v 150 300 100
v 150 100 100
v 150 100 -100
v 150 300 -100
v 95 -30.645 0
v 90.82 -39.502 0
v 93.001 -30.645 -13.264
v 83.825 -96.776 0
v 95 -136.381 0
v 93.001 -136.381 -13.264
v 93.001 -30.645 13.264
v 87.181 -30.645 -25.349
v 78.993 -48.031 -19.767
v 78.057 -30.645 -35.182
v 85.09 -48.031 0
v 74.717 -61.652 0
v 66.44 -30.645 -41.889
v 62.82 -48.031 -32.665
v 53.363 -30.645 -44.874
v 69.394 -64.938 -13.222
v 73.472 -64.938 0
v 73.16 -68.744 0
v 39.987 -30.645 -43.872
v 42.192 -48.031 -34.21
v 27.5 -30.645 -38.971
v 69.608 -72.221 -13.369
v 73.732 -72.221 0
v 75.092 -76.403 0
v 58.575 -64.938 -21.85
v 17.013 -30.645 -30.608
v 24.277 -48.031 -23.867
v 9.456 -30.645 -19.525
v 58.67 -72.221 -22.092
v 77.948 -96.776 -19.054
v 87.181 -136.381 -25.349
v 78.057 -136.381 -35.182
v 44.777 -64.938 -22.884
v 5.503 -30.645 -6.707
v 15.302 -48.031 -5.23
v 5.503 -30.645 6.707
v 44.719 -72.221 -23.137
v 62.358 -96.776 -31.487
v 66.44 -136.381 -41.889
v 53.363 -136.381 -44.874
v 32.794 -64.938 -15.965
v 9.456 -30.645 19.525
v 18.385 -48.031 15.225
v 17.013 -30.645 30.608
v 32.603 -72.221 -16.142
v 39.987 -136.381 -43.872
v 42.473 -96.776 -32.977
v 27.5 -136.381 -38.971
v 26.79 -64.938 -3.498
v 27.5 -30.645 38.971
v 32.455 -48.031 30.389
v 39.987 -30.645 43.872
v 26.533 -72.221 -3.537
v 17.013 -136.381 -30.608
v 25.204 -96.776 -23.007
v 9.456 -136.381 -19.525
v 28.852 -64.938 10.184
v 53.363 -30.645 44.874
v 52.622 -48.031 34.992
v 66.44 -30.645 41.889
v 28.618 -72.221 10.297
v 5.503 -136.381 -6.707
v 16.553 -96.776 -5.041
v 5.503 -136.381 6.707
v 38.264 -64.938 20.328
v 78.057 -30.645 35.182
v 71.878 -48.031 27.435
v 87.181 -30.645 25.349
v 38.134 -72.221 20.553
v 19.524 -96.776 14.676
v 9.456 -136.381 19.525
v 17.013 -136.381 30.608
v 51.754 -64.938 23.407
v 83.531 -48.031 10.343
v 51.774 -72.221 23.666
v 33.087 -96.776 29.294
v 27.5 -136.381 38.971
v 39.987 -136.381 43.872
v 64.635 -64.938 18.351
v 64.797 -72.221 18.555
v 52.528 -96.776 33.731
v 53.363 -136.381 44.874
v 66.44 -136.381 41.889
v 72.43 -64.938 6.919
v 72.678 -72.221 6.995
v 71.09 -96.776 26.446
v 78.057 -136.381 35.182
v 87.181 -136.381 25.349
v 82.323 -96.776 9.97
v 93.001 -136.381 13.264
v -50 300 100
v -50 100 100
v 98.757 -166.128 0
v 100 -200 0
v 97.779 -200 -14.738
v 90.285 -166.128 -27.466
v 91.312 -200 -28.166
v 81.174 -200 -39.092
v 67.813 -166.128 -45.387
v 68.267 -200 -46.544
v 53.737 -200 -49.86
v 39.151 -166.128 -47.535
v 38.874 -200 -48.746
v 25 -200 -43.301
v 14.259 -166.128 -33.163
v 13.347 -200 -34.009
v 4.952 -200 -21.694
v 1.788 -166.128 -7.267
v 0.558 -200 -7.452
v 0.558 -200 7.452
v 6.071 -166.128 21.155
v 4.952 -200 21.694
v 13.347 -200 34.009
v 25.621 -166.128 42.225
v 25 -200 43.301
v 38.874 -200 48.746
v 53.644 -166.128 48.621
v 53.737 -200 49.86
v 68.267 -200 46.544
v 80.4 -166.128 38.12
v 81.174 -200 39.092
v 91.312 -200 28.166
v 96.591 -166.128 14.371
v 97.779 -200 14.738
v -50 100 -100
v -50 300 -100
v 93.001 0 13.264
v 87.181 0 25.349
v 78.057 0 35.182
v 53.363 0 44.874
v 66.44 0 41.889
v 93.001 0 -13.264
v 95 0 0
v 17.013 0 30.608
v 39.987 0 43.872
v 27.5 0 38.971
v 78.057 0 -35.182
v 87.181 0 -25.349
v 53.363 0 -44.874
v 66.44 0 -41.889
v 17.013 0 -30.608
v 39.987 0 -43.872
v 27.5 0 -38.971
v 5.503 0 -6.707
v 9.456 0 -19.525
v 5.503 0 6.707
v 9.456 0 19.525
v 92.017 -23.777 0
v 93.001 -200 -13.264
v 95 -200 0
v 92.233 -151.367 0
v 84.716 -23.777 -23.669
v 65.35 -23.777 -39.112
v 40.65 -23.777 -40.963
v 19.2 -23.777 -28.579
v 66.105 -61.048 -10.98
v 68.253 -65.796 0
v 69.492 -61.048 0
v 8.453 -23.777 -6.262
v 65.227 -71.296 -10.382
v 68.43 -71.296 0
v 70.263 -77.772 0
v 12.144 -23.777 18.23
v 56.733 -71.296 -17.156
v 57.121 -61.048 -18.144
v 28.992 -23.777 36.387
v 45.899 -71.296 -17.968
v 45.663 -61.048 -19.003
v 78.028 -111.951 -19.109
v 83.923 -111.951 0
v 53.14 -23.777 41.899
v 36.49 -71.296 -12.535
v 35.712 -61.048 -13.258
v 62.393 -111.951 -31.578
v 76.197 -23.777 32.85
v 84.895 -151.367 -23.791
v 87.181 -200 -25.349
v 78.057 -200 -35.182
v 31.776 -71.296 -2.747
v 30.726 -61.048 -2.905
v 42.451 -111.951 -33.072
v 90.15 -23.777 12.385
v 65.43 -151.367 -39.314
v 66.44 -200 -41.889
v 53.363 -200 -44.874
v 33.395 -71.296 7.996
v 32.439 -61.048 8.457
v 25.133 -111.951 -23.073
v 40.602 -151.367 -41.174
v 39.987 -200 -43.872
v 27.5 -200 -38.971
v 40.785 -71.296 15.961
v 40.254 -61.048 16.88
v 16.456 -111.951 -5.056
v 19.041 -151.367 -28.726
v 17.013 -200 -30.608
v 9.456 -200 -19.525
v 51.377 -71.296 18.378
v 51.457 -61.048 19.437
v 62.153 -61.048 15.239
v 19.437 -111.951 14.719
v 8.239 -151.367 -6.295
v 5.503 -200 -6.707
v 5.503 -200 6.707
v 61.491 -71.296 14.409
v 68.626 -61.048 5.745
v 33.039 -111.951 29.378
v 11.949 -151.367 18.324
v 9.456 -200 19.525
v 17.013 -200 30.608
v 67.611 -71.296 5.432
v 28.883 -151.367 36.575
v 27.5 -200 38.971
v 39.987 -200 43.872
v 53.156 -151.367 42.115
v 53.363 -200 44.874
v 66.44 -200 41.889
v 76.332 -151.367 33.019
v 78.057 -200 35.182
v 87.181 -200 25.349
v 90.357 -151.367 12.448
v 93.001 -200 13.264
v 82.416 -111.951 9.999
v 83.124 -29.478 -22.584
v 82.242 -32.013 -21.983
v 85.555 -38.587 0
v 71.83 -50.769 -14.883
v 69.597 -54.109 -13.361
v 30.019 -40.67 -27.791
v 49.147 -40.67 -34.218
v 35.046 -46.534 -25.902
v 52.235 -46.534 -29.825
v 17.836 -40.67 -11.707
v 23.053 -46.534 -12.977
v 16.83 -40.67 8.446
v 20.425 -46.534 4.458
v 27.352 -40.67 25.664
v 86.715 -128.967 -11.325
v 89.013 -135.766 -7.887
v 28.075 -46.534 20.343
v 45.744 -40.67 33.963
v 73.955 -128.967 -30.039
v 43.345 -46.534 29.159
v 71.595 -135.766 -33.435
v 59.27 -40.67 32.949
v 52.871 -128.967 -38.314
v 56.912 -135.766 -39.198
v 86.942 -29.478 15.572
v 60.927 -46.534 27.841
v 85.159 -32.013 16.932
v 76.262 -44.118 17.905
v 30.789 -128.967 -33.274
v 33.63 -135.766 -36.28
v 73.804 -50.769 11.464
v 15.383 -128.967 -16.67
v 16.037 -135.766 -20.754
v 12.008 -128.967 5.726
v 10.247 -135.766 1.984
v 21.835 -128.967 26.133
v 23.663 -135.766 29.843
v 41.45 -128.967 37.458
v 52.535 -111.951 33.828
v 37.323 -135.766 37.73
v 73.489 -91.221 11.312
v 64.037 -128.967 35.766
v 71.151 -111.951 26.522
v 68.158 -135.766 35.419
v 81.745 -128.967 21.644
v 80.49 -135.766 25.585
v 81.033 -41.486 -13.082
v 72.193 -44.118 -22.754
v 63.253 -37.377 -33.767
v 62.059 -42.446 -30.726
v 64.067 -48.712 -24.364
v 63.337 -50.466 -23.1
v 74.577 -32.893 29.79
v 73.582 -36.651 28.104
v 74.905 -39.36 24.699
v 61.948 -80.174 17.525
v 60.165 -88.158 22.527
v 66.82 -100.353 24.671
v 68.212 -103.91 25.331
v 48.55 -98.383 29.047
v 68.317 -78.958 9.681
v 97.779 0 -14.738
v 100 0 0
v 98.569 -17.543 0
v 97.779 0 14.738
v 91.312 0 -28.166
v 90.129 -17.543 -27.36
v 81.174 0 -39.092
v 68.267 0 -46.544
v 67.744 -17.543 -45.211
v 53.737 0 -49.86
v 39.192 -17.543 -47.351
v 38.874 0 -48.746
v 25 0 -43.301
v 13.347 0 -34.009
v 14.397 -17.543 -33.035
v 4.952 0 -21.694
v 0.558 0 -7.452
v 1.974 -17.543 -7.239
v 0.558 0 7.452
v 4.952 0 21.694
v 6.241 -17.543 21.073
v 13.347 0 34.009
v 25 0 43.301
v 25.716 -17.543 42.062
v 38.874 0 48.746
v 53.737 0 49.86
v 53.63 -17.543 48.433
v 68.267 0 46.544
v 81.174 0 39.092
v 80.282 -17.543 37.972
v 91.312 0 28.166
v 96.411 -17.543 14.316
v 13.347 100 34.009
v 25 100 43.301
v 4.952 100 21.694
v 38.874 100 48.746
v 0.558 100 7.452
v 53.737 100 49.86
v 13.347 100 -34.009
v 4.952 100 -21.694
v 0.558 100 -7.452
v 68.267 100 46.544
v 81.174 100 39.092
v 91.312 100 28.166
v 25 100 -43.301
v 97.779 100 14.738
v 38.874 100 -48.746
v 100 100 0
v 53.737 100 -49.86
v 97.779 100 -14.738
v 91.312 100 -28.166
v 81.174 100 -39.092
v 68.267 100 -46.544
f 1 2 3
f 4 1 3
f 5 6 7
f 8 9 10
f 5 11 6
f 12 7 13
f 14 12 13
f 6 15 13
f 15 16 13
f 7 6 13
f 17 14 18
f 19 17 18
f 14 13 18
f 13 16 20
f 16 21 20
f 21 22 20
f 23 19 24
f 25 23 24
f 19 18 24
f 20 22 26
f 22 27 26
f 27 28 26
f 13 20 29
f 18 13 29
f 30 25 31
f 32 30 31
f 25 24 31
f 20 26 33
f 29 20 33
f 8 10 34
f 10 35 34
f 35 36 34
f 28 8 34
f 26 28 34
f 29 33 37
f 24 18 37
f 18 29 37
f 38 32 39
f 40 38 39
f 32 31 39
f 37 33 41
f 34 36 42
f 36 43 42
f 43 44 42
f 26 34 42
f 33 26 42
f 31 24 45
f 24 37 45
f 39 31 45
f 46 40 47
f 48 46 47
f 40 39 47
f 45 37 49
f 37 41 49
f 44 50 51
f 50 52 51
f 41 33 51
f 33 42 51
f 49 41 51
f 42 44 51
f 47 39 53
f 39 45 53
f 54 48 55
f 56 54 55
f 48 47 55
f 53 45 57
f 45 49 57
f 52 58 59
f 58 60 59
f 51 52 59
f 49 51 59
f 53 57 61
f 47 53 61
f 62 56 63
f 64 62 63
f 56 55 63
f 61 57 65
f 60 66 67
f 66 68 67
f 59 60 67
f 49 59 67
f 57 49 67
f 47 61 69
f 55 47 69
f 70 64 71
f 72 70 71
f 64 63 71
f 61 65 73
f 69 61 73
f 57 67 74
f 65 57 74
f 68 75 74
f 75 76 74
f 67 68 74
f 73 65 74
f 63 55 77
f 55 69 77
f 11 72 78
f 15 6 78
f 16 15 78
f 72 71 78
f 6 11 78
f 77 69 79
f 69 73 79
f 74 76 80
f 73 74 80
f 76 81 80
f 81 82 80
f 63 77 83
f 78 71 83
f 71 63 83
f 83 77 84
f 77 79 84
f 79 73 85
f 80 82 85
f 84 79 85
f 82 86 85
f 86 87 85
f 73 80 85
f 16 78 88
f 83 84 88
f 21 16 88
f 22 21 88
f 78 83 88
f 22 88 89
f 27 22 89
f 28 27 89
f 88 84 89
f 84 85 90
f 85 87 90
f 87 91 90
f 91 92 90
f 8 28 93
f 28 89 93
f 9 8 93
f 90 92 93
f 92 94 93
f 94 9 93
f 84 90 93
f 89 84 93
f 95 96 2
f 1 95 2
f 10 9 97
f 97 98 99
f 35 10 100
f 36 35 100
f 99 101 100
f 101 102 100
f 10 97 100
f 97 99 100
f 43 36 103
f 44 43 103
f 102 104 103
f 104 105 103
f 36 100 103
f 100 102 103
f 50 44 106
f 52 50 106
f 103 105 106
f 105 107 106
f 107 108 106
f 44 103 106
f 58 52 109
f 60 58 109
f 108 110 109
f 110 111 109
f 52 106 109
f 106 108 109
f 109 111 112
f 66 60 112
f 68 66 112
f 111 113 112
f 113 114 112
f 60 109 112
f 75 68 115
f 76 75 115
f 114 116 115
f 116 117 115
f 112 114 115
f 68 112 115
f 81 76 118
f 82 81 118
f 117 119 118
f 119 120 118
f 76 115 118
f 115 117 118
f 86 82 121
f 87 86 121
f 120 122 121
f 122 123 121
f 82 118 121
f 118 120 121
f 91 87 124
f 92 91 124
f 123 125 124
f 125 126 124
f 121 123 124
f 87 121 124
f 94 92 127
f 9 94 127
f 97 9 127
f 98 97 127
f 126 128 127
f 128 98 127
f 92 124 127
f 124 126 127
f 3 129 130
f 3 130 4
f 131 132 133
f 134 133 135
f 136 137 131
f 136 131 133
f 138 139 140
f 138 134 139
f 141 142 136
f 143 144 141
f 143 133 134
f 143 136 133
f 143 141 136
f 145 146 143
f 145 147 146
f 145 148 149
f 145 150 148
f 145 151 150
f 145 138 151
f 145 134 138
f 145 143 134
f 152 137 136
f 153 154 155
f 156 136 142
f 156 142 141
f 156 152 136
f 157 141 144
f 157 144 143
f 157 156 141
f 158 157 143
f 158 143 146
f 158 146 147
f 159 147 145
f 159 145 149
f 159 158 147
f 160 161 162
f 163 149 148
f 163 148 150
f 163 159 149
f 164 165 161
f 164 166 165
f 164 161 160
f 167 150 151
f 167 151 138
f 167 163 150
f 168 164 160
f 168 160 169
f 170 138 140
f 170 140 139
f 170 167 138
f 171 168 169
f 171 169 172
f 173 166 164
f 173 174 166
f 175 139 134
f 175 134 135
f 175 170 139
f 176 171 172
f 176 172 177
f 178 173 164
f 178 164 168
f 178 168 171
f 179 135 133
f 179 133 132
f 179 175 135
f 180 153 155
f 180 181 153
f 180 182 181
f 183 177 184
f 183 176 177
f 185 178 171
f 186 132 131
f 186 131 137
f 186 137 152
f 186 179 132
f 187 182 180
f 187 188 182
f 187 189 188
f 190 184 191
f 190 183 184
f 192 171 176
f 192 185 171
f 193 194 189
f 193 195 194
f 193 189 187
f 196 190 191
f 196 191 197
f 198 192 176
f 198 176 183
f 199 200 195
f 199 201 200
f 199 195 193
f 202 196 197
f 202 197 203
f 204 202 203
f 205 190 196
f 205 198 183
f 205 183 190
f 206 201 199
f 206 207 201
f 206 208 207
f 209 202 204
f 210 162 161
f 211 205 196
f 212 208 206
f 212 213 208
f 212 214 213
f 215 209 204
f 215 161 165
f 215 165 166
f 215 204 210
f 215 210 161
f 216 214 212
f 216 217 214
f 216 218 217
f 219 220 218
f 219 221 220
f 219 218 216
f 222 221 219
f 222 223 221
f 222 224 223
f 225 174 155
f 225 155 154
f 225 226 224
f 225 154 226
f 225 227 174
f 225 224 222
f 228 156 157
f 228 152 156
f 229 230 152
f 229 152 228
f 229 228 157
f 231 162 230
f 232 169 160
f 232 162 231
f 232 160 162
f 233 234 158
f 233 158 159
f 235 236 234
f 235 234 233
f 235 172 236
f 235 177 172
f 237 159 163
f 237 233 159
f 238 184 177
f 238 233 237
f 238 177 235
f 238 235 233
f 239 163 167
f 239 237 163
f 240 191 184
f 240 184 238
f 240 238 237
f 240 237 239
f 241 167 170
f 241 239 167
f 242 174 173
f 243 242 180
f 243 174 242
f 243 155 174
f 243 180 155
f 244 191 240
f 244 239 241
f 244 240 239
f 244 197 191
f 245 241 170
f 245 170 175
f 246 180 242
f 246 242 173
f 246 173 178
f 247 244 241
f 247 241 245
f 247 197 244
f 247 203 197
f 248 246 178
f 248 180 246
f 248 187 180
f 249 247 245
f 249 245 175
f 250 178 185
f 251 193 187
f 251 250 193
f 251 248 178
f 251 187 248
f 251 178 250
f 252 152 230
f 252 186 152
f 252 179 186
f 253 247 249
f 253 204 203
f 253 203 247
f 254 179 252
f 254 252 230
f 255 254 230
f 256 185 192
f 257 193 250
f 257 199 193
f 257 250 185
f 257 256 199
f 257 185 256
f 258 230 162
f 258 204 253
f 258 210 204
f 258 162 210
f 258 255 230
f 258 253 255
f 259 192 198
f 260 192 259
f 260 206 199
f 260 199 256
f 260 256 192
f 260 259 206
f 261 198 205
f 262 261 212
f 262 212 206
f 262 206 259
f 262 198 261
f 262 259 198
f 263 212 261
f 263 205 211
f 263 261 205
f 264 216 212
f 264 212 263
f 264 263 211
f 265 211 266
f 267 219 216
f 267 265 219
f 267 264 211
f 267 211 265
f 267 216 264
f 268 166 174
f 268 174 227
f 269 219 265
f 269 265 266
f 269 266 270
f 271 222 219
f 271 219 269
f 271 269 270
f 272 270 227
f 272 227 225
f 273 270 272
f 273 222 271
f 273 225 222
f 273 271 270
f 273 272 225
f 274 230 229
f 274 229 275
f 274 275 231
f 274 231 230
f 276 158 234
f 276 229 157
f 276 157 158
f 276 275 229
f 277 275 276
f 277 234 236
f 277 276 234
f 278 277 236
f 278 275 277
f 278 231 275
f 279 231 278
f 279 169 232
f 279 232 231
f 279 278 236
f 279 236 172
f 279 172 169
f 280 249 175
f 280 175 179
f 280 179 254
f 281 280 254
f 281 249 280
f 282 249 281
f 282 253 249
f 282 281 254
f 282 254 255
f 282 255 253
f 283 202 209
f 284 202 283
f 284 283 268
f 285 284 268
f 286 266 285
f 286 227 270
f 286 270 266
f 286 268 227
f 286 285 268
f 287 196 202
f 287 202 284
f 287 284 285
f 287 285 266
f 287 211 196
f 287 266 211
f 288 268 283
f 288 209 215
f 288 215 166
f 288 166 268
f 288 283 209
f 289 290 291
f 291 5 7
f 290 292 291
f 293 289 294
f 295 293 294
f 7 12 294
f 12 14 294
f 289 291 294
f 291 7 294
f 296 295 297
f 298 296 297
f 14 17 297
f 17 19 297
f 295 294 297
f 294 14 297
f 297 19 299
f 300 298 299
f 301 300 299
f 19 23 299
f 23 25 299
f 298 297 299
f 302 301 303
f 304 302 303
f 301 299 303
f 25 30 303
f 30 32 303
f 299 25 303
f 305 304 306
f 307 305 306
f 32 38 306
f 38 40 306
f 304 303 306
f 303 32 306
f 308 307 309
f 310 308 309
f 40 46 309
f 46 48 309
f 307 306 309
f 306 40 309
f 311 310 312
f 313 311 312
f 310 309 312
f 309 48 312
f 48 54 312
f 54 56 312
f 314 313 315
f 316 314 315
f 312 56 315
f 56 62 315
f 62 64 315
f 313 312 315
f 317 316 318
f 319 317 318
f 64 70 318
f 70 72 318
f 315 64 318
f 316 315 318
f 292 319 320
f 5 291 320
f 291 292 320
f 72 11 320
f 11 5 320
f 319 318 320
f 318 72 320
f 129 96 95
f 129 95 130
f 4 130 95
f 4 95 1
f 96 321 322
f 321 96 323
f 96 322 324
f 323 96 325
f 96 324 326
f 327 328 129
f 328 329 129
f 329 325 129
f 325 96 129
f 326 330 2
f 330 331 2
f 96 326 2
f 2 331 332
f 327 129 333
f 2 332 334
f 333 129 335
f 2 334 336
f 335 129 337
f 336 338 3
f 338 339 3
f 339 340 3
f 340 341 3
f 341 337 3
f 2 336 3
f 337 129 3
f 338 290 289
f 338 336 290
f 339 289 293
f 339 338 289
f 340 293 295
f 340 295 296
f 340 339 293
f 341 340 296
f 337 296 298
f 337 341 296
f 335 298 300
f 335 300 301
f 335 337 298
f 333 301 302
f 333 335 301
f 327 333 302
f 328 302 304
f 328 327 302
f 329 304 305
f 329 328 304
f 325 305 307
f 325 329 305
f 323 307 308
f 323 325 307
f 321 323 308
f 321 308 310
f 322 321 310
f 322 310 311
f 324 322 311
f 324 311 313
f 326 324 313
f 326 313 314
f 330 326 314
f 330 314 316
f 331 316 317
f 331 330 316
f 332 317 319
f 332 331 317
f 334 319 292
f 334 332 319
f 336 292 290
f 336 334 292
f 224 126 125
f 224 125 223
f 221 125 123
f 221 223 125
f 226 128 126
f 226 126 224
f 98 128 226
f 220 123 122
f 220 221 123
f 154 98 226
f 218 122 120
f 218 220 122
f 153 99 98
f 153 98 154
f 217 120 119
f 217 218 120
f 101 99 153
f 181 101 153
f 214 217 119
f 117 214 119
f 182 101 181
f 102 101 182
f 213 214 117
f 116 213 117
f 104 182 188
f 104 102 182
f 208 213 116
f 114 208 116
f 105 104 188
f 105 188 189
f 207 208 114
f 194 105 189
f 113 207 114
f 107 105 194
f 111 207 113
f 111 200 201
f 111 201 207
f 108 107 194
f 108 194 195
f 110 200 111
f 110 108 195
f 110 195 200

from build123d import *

# Parameters (mm, degrees)
REVOLVE1_OUTLINE_W   = 5
REVOLVE1_OUTLINE_H   = 100
REVOLVE1_OUTLINE_W_2 = 45
SKETCH2_W            = 200
SKETCH2_H            = 200
BOSS_EXTRUDE1_DEPTH  = 200


# Read off the part's stored shape, not the designer's step: Revolve1
with BuildPart() as part:
    # Revolve1 outline → Revolve1 (revolve)
    with BuildSketch(Plane(origin=(50, 0, 0), x_dir=(1, 0, 0), z_dir=(0, 0, 1))):
        with Locations((47.5, 50)):
            Rectangle(REVOLVE1_OUTLINE_W, REVOLVE1_OUTLINE_H)
        with BuildLine():
            add(Edge.make_bspline(
                [(50, 0), (50, -8.082762567), (49.349957781, -15.002219913), (48.209745328, -20.96390459), (46.719575094, -26.132708235), (45, -30.644804173)],
                knots=[0, 0, 0, 0, 0, 0, 0.122970463, 0.122970463, 0.122970463, 0.122970463, 0.122970463, 0.122970463], degree=5))
            Line((50, 0), (45, 0))
            Line((45, 0), (45, -30.644804173))
        make_face()
        with Locations((22.5, 50)):
            Rectangle(REVOLVE1_OUTLINE_W_2, REVOLVE1_OUTLINE_H)
        with BuildLine():
            add(Edge.make_bspline(
                [(45, -30.644804173), (34.455506857, -58.313130409), (15.284968329, -61.288036888), (15.284968329, -70.967793904), (34.455506857, -78.145887533), (45, -136.380827106)],
                knots=[0.122970463, 0.122970463, 0.122970463, 0.122970463, 0.122970463, 0.122970463, 0.877029537, 0.877029537, 0.877029537, 0.877029537, 0.877029537, 0.877029537], degree=5))
            Line((45, -30.644804173), (45, 0))
            add(Edge.make_bspline(
                [(45, 0), (45, -0.805913513), (44.983206143, -2.440345101), (44.885909174, -5.527357683), (44.651249209, -9.180617017), (44.208693768, -13.22104238), (43.429179035, -18.197149025), (42.145056936, -23.699932493), (40.238749724, -29.339291486), (38.077480396, -34.180232479), (34.979043101, -39.765346635), (30.901795474, -45.44053167), (26.211141954, -50.99117289), (22.123818579, -55.99940601), (19.504937862, -60.49603289), (18.327366237, -64.615511375), (18.036096382, -67.865198675), (18.325954828, -71.151011846), (19.354041911, -75.549666709), (21.595505158, -81.301527469), (25.440968359, -89.686697726), (29.365247929, -98.822414083), (32.703100041, -108.024070812), (35.228496377, -116.046022636), (37.689368772, -125.375404851), (39.98622015, -136.217854158), (41.670948279, -146.701049549), (42.819586689, -156.079119992), (43.564957316, -163.641363627), (44.177194916, -171.766381725), (44.561675987, -179.035635061), (44.784641201, -185.169118612), (44.907191495, -189.931856825), (44.970095656, -194.044527702), (44.995668899, -197.414073857), (45, -199.141583294), (45, -200)],
                knots=[0, 0, 0, 0, 0.0078125, 0.015625, 0.03125, 0.046875, 0.0625, 0.09375, 0.125, 0.15625, 0.1875, 0.25, 0.3125, 0.375, 0.4375, 0.46875, 0.5, 0.53125, 0.5625, 0.625, 0.6875, 0.75, 0.78125, 0.8125, 0.84375, 0.875, 0.90625, 0.921875, 0.9375, 0.953125, 0.96875, 0.9765625, 0.984375, 0.9921875, 0.99609375, 1, 1, 1, 1], degree=3))
            Line((45, -200), (45, -136.380827106))
        make_face()
        with BuildLine():
            Line((45, -200), (50, -200))
            add(Edge.make_bspline(
                [(45, -136.380827106), (46.719575094, -145.877665912), (48.209745328, -156.732333022), (49.349957781, -169.177110028), (50, -183.488669983), (50, -200)],
                knots=[0.877029537, 0.877029537, 0.877029537, 0.877029537, 0.877029537, 0.877029537, 1, 1, 1, 1, 1, 1], degree=5))
            Line((45, -136.380827106), (45, -200))
        make_face()
    revolve(axis=Axis((50, 0, 0), (0, 1, 0)))

    # Sketch2 → Boss-Extrude1 (add)
    with BuildSketch(Plane(origin=(0, 100, 0), x_dir=(1, 0, 0), z_dir=(0, 1, 0))):
        with Locations((50, 0)):
            Rectangle(SKETCH2_W, SKETCH2_H)
    extrude(amount=BOSS_EXTRUDE1_DEPTH)


solid = part.part
